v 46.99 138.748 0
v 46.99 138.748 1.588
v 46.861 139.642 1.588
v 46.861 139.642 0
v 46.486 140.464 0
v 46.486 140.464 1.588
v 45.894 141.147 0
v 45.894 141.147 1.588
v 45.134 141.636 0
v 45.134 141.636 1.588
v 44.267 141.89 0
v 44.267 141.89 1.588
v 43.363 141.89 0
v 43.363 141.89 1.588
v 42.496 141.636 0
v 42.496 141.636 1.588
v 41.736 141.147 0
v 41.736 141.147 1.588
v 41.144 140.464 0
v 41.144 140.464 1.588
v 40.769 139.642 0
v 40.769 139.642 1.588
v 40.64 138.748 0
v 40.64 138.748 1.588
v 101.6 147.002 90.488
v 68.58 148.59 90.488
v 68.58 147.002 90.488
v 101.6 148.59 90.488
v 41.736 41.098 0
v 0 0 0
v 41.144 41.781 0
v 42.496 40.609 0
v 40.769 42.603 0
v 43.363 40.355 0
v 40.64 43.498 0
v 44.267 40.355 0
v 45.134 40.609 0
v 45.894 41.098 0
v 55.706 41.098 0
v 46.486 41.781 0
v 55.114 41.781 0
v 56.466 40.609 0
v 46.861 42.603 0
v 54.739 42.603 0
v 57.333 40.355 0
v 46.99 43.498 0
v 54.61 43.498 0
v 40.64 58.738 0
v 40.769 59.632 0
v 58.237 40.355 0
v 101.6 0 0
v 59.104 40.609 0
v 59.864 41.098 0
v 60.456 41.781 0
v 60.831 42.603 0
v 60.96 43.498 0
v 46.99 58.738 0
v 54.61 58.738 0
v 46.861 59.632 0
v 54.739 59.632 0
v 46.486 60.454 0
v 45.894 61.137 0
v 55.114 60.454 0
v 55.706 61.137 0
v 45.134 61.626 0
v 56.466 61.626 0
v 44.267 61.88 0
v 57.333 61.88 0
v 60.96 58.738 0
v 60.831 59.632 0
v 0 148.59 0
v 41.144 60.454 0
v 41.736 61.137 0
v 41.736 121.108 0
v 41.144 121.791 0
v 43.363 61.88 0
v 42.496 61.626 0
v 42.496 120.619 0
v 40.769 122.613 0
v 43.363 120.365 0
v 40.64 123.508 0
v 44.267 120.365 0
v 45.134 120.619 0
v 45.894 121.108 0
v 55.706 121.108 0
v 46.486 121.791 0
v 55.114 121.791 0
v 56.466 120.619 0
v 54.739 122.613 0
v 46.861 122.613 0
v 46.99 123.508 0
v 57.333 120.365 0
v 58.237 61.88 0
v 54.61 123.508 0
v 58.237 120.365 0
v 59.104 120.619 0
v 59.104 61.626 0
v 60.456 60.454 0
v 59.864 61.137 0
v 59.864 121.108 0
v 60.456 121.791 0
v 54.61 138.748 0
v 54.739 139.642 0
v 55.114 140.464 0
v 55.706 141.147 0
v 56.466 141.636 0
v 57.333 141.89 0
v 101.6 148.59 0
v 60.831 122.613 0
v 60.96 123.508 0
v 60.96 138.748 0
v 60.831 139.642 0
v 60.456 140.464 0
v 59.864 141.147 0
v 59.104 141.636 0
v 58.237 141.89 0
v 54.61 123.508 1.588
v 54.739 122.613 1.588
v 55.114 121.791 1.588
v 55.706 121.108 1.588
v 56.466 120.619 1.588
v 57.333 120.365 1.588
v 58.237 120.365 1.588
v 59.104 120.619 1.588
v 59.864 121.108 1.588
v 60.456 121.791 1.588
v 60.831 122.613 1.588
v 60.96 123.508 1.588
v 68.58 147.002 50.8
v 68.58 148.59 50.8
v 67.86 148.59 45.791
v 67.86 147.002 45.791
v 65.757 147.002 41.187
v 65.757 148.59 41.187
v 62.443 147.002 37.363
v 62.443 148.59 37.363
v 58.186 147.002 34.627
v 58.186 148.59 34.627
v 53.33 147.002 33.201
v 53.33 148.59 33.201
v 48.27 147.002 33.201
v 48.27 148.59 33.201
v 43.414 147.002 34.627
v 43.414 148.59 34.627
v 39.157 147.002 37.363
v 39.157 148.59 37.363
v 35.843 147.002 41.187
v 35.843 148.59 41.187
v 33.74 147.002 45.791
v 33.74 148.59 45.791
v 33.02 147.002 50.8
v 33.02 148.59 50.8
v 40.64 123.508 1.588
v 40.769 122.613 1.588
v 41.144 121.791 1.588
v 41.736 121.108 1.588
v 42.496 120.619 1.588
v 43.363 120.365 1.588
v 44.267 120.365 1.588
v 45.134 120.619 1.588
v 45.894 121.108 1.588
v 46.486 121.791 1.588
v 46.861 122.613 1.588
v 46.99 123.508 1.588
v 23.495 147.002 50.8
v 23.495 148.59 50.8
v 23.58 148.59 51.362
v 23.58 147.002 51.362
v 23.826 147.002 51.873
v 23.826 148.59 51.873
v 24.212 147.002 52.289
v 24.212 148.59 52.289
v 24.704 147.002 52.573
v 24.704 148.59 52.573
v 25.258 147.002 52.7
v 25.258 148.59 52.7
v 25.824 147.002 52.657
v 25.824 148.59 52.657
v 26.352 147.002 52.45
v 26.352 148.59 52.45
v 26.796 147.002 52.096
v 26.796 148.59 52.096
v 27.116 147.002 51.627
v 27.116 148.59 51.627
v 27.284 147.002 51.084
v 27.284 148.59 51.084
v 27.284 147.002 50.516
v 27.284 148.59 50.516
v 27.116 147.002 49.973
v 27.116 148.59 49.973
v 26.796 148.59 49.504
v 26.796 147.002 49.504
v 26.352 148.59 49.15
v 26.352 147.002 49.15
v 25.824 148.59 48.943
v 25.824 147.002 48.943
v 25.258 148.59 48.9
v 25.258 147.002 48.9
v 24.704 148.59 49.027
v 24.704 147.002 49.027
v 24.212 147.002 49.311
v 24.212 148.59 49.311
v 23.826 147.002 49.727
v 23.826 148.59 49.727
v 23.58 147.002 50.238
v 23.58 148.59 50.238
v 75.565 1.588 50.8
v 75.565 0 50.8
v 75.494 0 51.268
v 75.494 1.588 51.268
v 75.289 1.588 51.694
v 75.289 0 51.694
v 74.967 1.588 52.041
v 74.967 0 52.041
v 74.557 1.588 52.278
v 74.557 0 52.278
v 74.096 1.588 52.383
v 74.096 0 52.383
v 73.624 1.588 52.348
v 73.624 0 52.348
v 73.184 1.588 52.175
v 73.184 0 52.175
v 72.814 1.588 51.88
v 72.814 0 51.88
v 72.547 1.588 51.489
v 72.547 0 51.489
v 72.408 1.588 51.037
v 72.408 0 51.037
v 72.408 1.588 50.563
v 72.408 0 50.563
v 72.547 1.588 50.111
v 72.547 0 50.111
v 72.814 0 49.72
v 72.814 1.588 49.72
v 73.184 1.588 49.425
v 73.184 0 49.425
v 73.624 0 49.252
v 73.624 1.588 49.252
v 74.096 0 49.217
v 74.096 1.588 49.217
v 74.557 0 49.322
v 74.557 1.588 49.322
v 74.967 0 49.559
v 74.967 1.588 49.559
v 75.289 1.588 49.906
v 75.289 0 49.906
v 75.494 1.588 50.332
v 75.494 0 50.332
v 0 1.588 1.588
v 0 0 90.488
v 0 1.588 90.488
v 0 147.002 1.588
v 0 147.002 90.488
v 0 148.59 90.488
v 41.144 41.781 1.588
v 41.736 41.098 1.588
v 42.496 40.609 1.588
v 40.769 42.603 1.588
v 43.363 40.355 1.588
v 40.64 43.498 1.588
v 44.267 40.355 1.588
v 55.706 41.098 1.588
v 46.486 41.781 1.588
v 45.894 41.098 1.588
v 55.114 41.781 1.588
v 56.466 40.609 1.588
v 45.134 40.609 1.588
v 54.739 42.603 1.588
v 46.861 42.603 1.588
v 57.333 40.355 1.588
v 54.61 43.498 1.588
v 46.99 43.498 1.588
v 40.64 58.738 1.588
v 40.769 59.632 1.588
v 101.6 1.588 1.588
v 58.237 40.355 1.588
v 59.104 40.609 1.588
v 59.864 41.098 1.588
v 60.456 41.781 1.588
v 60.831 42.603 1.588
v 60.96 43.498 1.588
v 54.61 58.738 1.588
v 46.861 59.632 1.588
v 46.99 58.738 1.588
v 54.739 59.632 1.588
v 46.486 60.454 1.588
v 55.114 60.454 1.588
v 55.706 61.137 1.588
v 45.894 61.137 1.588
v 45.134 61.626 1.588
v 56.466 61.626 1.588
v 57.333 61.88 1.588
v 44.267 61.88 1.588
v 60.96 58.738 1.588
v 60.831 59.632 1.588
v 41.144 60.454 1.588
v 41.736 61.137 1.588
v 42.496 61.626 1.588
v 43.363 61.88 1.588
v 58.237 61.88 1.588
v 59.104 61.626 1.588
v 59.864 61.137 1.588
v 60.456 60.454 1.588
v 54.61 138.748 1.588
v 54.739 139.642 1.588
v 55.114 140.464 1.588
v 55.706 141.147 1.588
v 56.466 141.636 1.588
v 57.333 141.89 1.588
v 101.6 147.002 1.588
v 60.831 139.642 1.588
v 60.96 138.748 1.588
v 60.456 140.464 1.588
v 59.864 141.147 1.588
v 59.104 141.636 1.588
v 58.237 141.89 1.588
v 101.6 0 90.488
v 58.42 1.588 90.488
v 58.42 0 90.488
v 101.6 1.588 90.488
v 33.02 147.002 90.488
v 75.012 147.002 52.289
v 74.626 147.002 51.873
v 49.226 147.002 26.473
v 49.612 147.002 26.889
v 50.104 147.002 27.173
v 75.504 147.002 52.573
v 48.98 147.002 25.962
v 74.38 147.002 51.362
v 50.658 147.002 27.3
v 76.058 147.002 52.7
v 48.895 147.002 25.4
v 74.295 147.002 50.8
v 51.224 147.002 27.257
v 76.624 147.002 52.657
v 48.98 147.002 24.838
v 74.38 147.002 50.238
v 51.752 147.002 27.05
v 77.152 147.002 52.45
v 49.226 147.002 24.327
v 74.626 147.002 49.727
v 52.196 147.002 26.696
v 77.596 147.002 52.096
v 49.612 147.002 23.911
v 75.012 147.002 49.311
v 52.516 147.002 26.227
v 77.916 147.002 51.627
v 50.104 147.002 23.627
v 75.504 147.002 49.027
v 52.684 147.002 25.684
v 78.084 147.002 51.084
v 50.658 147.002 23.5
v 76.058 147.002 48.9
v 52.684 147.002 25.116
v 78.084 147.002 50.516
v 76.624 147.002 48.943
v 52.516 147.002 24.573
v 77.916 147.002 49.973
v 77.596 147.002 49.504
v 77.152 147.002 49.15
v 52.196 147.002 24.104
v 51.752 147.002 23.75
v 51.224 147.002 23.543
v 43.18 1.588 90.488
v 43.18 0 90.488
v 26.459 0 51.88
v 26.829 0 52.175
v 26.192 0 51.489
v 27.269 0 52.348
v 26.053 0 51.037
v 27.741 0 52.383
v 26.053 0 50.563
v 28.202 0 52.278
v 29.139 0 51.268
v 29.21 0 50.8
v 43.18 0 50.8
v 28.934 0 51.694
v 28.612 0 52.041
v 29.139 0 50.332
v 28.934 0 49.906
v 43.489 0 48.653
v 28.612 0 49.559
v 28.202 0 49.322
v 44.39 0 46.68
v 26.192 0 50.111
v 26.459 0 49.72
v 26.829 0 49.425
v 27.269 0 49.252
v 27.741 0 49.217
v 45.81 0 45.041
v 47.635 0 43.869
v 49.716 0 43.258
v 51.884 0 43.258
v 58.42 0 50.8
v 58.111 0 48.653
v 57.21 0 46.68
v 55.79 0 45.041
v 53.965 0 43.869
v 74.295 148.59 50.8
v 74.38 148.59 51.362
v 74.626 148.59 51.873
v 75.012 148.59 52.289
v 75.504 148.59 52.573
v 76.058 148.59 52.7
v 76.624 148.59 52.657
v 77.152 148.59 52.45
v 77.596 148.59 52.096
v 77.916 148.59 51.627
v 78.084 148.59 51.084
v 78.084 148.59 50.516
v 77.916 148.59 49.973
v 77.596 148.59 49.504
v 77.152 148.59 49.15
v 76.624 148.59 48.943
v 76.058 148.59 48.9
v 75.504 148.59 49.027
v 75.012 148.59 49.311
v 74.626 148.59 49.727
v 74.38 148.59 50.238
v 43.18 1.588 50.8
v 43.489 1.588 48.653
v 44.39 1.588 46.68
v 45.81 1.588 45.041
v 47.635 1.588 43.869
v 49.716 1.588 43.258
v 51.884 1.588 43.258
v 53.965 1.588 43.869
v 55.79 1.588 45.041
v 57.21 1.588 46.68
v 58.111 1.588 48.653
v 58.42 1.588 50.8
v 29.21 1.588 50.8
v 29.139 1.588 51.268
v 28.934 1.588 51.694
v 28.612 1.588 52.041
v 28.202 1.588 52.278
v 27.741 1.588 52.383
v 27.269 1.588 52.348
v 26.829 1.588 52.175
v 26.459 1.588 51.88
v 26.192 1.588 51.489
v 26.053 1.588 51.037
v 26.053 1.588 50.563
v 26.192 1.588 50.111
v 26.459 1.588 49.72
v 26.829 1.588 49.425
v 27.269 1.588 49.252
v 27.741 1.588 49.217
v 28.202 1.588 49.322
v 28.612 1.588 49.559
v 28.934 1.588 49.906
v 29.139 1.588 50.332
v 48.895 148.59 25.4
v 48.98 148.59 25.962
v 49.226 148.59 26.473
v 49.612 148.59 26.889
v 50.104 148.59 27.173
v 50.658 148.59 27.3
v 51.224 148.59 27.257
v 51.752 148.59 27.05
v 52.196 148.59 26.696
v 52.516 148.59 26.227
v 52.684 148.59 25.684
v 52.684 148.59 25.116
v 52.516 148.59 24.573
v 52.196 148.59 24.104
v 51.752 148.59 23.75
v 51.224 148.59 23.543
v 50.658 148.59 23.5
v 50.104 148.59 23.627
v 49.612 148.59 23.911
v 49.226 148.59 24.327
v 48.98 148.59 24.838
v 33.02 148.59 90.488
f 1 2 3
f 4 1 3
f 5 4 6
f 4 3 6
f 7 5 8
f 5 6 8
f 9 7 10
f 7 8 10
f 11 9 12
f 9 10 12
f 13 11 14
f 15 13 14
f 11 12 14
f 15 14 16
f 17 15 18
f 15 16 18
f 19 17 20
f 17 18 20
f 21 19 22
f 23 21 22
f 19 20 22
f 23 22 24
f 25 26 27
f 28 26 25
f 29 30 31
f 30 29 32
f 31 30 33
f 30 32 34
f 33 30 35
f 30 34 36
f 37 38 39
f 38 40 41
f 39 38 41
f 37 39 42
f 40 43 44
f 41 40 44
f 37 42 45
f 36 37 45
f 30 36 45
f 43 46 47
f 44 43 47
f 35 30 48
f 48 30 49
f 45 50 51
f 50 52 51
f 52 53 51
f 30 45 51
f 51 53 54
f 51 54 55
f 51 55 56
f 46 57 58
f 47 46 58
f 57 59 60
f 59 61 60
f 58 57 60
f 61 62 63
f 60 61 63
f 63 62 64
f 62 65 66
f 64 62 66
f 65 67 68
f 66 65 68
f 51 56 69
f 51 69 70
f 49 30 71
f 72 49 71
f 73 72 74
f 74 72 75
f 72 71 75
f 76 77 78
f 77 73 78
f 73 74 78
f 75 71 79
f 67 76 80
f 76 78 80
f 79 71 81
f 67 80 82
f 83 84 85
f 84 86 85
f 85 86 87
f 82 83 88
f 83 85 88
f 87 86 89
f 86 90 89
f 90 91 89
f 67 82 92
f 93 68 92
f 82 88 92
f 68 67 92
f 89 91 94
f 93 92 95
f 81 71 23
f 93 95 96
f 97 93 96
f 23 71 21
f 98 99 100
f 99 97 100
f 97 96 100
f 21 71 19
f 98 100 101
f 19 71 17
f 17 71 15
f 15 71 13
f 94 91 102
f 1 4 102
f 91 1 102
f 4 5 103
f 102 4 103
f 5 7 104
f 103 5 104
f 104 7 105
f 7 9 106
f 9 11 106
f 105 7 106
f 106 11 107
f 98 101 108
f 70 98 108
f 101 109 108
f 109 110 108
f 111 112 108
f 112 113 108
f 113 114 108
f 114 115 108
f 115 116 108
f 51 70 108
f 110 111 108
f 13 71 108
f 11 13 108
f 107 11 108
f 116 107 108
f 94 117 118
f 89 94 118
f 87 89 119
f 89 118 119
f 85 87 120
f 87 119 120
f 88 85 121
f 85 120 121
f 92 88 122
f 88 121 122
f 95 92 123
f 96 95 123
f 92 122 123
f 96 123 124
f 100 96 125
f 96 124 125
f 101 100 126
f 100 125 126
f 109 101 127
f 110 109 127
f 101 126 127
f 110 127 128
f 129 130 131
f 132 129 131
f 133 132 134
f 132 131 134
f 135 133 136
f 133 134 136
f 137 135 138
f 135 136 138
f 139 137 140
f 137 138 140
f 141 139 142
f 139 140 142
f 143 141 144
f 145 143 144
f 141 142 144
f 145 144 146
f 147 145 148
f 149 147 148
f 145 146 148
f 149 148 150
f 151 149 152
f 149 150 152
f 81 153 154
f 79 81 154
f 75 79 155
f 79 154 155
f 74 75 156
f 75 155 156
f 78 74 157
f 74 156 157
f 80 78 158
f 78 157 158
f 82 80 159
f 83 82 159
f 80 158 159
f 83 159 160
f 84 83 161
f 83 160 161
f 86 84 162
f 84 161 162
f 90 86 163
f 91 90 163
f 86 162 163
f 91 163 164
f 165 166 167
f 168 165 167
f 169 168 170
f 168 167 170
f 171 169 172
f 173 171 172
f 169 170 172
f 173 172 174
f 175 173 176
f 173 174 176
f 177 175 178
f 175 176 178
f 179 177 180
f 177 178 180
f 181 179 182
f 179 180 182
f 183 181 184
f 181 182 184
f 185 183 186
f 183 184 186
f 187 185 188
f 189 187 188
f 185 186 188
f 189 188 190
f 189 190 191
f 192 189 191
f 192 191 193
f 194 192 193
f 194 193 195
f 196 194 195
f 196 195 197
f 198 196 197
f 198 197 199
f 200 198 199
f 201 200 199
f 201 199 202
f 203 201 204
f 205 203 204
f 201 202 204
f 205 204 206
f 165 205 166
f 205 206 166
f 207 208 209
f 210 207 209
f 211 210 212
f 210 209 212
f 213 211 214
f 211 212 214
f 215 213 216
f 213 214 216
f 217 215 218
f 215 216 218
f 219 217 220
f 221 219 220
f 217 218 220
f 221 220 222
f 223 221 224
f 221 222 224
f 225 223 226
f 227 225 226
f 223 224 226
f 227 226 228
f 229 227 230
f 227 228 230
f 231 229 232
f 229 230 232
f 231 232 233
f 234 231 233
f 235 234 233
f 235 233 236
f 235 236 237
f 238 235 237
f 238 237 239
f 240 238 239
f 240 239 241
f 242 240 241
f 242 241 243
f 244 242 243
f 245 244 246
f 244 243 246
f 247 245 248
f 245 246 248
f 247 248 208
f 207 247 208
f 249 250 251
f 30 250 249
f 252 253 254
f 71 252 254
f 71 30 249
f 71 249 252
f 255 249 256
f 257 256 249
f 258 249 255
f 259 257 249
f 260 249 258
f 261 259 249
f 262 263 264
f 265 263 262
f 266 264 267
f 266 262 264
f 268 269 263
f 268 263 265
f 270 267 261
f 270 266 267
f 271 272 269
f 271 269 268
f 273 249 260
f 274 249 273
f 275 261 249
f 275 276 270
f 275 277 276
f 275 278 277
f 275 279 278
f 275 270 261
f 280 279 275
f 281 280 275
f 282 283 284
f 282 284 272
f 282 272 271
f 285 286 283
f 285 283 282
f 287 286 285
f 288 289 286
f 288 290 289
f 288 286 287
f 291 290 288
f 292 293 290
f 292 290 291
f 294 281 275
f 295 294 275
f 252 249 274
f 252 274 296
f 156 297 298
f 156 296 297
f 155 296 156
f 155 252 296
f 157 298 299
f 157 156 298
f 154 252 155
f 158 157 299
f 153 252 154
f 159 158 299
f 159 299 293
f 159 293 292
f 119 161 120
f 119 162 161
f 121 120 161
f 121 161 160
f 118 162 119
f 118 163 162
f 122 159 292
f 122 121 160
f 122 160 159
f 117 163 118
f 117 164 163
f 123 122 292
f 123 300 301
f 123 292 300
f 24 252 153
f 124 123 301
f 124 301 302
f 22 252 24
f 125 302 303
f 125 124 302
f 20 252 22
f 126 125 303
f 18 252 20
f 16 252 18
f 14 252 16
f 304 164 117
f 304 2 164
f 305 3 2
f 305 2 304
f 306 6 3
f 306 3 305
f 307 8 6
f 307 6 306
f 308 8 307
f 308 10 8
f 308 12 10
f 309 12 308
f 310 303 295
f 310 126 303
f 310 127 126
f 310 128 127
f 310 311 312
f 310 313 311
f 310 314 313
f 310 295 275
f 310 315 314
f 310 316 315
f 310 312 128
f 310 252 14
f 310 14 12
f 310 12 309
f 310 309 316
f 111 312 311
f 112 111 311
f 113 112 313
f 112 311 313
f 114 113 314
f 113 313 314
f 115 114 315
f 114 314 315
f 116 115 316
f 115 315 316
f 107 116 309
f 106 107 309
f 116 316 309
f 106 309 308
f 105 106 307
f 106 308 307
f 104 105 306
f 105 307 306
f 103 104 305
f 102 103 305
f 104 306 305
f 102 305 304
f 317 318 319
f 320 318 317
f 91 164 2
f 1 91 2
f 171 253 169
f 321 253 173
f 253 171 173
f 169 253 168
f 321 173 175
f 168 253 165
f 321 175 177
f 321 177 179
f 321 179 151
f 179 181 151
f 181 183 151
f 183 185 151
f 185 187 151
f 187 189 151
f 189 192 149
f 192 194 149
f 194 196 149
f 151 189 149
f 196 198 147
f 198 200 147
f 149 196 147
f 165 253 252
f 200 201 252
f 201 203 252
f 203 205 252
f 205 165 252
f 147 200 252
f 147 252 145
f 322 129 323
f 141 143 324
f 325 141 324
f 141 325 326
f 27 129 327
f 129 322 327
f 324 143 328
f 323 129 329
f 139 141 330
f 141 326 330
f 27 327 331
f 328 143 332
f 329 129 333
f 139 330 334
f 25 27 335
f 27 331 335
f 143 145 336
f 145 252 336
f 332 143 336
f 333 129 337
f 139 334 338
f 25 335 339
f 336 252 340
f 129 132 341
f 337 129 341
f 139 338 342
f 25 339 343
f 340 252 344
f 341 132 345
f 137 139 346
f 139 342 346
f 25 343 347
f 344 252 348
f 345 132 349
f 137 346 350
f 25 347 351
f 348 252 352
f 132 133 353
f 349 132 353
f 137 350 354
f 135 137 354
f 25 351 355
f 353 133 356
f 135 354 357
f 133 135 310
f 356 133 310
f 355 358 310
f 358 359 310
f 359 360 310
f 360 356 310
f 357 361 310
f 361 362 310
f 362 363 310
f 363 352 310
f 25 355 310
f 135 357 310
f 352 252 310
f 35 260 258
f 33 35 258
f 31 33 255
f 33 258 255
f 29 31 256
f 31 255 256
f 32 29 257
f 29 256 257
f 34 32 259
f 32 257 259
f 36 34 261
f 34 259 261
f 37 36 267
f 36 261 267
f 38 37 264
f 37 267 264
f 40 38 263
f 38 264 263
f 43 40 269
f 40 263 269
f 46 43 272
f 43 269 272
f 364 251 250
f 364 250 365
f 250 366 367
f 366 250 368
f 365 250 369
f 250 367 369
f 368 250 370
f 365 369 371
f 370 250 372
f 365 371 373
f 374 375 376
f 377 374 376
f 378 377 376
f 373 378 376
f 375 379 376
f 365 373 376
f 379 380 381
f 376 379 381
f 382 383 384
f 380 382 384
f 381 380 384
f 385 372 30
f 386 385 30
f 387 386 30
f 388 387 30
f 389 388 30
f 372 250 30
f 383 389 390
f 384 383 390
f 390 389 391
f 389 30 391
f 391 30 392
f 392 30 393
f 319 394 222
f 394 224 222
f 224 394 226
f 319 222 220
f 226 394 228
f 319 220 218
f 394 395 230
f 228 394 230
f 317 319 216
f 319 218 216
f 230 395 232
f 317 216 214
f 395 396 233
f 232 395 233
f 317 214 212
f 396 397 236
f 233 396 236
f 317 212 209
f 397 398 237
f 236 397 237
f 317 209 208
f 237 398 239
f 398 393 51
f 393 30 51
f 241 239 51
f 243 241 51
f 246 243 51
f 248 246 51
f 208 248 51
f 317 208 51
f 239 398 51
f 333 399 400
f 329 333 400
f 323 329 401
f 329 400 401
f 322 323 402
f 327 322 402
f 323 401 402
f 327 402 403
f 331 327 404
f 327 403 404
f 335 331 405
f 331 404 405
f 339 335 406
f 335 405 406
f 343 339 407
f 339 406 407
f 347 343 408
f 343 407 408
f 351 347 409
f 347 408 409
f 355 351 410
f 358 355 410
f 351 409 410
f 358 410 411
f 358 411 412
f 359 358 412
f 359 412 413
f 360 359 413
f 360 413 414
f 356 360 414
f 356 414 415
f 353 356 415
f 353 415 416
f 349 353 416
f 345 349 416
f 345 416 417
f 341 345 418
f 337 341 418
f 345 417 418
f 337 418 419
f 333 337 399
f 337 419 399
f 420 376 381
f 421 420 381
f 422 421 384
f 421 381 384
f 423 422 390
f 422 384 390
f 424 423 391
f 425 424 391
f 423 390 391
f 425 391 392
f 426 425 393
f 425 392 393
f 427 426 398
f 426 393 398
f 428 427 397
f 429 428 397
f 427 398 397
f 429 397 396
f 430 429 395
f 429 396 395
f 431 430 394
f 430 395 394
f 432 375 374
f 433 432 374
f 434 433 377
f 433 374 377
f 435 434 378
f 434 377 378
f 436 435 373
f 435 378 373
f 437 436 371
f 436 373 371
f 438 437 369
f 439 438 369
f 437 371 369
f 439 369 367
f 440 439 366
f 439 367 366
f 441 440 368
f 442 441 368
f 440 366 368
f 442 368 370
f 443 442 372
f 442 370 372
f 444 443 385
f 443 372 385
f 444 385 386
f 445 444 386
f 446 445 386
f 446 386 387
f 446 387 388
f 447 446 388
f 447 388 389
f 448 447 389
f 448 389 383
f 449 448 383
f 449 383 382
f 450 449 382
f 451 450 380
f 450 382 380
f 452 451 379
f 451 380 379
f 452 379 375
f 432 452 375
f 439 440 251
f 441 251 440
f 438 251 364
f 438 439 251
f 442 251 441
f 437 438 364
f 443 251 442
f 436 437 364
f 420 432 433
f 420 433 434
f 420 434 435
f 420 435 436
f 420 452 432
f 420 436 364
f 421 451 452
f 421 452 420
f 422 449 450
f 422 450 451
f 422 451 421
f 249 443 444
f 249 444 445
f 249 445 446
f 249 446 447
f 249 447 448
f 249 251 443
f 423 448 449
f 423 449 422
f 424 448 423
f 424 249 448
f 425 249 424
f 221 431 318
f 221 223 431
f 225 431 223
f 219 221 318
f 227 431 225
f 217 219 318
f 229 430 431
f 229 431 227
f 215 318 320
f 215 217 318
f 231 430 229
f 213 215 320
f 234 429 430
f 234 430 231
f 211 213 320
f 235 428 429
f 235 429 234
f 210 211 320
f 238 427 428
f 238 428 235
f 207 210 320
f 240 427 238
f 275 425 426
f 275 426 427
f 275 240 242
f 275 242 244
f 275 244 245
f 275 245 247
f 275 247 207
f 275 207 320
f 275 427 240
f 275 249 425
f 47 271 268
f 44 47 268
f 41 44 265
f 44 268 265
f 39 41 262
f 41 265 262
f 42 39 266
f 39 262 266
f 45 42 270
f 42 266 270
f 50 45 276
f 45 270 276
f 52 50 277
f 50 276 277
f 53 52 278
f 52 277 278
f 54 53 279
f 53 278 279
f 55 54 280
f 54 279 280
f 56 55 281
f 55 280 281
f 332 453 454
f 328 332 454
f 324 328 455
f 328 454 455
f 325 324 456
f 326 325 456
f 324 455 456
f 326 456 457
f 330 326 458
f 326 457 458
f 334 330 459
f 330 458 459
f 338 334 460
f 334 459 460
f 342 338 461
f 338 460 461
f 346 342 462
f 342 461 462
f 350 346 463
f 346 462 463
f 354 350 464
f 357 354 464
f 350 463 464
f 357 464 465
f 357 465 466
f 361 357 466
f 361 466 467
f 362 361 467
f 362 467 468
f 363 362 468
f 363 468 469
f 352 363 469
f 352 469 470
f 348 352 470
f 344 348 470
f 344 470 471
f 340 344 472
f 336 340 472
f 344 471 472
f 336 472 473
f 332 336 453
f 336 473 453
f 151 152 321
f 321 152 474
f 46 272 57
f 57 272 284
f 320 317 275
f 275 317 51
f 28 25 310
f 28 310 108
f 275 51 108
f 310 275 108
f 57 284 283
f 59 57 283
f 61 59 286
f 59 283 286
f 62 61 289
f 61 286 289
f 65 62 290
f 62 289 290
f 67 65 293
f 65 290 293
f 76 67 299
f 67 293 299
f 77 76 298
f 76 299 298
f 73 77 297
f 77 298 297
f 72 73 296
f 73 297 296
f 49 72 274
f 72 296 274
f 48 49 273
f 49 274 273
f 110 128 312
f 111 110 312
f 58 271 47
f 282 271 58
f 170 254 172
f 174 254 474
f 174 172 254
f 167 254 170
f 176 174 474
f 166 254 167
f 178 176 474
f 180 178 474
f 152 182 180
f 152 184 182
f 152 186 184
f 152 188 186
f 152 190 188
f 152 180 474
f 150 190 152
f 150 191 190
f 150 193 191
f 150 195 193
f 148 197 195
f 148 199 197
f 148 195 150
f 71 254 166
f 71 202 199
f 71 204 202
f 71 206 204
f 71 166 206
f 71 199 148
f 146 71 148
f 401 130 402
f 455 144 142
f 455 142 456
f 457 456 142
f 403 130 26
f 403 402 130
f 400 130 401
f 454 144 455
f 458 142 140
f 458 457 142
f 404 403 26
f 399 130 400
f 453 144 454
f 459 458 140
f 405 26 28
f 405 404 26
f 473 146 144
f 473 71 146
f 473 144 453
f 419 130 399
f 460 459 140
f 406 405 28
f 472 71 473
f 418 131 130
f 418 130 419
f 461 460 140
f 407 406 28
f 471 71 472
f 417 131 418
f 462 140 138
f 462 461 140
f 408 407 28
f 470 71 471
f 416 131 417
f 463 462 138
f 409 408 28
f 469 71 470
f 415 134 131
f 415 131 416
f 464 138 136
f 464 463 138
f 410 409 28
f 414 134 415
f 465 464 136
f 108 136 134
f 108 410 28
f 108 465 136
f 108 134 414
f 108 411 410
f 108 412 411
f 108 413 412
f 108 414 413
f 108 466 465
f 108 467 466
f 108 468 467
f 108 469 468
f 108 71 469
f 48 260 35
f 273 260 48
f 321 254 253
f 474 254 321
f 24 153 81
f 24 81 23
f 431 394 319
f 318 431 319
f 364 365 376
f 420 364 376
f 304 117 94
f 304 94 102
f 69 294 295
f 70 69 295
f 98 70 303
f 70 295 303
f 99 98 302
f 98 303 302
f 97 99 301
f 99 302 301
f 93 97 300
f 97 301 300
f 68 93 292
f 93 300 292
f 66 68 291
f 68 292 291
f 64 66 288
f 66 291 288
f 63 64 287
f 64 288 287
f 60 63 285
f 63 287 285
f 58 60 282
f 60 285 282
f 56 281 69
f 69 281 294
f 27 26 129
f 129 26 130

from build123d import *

# Parameters (mm, degrees)
F0_W      = 101.6
F0_H      = 148.59
F1_DEPTH  = 1.5875
F2_W      = 101.6
F2_H      = 1.5875
F3_DEPTH  = 88.9
F5_R      = 1.905
F6_DEPTH  = 1.5875
F7_R      = 1.5875
F8_DEPTH  = 1.5875
F9_W      = 6.35
F9_H      = 15.24
F10_DEPTH = 1.5875


with BuildPart() as f1:
    # F0 (on Top) → F1 (new body)
    with BuildSketch(Plane.XY):
        with Locations((50.8, 74.295)):
            Rectangle(F0_W, F0_H)
    extrude(amount=F1_DEPTH)

    # F2 (on face) → F3 (join)
    with BuildSketch(Plane.XY.offset(1.5875)):
        with Locations((50.8, 147.79625)):
            Rectangle(F2_W, F2_H)
        with Locations((50.8, 0.79375)):
            Rectangle(F2_W, F2_H)
    extrude(amount=F3_DEPTH)

    # F5 (on face) → F6 (cut, through all)
    with BuildSketch(Plane(origin=(0, 148.59, 0), x_dir=(-1, 0, 0), z_dir=(0, 1, 0))):
        with BuildLine():
            ThreePointArc((-68.58, 50.8), (-50.8, 33.02), (-33.02, 50.8))
            ThreePointArc((-33.02, 50.8), (-50.8, 68.58), (-68.58, 50.8))
        make_face()
        with BuildLine():
            ThreePointArc((-68.58, 50.8), (-50.8, 68.58), (-33.02, 50.8))
            Line((-33.02, 50.8), (-33.02, 90.4875))
            Line((-33.02, 90.4875), (-68.58, 90.4875))
            Line((-68.58, 90.4875), (-68.58, 50.8))
        make_face()
        with Locations((-50.8, 25.4)):
            Circle(F5_R)
        with Locations((-25.4, 50.8)):
            Circle(F5_R)
        with Locations((-76.2, 50.8)):
            Circle(F5_R)
    extrude(amount=-F6_DEPTH, mode=Mode.SUBTRACT)

    # F7 (on face) → F8 (cut, through all)
    with BuildSketch(Plane.XZ):
        with BuildLine():
            ThreePointArc((43.18, 50.8), (50.8, 43.18), (58.42, 50.8))
            ThreePointArc((58.42, 50.8), (50.8, 58.42), (43.18, 50.8))
        make_face()
        with BuildLine():
            ThreePointArc((43.18, 50.8), (50.8, 58.42), (58.42, 50.8))
            Line((58.42, 50.8), (58.42, 90.4875))
            Line((58.42, 90.4875), (43.18, 90.4875))
            Line((43.18, 90.4875), (43.18, 50.8))
        make_face()
        with Locations((73.9775, 50.8)):
            Circle(F7_R)
        with Locations((27.6225, 50.8)):
            Circle(F7_R)
    extrude(amount=-F8_DEPTH, mode=Mode.SUBTRACT)

    # F9 (on face) → F10 (cut, through all)
    with BuildSketch(Plane.XY.offset(1.5875)):
        with BuildLine():
            ThreePointArc((46.99, 138.7475), (43.815, 141.9225), (40.64, 138.7475))
            Line((40.64, 138.7475), (46.99, 138.7475))
        make_face()
        with Locations((43.815, 131.1275)):
            Rectangle(F9_W, F9_H)
        with BuildLine():
            Line((46.99, 123.5075), (40.64, 123.5075))
            ThreePointArc((40.64, 123.5075), (43.815, 120.3325), (46.99, 123.5075))
        make_face()
        with Locations((57.785, 131.1275)):
            Rectangle(F9_W, F9_H)
        with BuildLine():
            Line((54.61, 138.7475), (60.96, 138.7475))
            ThreePointArc((60.96, 138.7475), (57.785, 141.9225), (54.61, 138.7475))
        make_face()
        with BuildLine():
            ThreePointArc((54.61, 123.5075), (57.785, 120.3325), (60.96, 123.5075))
            Line((60.96, 123.5075), (54.61, 123.5075))
        make_face()
        with BuildLine():
            ThreePointArc((54.61, 43.4975), (57.785, 40.3225), (60.96, 43.4975))
            Line((60.96, 43.4975), (54.61, 43.4975))
        make_face()
        with Locations((57.785, 51.1175)):
            Rectangle(F9_W, F9_H)
        with BuildLine():
            Line((54.61, 58.7375), (60.96, 58.7375))
            ThreePointArc((60.96, 58.7375), (57.785, 61.9125), (54.61, 58.7375))
        make_face()
        with BuildLine():
            Line((46.99, 43.4975), (40.64, 43.4975))
            ThreePointArc((40.64, 43.4975), (43.815, 40.3225), (46.99, 43.4975))
        make_face()
        with Locations((43.815, 51.1175)):
            Rectangle(F9_W, F9_H)
        with BuildLine():
            ThreePointArc((46.99, 58.7375), (43.815, 61.9125), (40.64, 58.7375))
            Line((40.64, 58.7375), (46.99, 58.7375))
        make_face()
    extrude(amount=-F10_DEPTH, mode=Mode.SUBTRACT)


solid = f1.part
